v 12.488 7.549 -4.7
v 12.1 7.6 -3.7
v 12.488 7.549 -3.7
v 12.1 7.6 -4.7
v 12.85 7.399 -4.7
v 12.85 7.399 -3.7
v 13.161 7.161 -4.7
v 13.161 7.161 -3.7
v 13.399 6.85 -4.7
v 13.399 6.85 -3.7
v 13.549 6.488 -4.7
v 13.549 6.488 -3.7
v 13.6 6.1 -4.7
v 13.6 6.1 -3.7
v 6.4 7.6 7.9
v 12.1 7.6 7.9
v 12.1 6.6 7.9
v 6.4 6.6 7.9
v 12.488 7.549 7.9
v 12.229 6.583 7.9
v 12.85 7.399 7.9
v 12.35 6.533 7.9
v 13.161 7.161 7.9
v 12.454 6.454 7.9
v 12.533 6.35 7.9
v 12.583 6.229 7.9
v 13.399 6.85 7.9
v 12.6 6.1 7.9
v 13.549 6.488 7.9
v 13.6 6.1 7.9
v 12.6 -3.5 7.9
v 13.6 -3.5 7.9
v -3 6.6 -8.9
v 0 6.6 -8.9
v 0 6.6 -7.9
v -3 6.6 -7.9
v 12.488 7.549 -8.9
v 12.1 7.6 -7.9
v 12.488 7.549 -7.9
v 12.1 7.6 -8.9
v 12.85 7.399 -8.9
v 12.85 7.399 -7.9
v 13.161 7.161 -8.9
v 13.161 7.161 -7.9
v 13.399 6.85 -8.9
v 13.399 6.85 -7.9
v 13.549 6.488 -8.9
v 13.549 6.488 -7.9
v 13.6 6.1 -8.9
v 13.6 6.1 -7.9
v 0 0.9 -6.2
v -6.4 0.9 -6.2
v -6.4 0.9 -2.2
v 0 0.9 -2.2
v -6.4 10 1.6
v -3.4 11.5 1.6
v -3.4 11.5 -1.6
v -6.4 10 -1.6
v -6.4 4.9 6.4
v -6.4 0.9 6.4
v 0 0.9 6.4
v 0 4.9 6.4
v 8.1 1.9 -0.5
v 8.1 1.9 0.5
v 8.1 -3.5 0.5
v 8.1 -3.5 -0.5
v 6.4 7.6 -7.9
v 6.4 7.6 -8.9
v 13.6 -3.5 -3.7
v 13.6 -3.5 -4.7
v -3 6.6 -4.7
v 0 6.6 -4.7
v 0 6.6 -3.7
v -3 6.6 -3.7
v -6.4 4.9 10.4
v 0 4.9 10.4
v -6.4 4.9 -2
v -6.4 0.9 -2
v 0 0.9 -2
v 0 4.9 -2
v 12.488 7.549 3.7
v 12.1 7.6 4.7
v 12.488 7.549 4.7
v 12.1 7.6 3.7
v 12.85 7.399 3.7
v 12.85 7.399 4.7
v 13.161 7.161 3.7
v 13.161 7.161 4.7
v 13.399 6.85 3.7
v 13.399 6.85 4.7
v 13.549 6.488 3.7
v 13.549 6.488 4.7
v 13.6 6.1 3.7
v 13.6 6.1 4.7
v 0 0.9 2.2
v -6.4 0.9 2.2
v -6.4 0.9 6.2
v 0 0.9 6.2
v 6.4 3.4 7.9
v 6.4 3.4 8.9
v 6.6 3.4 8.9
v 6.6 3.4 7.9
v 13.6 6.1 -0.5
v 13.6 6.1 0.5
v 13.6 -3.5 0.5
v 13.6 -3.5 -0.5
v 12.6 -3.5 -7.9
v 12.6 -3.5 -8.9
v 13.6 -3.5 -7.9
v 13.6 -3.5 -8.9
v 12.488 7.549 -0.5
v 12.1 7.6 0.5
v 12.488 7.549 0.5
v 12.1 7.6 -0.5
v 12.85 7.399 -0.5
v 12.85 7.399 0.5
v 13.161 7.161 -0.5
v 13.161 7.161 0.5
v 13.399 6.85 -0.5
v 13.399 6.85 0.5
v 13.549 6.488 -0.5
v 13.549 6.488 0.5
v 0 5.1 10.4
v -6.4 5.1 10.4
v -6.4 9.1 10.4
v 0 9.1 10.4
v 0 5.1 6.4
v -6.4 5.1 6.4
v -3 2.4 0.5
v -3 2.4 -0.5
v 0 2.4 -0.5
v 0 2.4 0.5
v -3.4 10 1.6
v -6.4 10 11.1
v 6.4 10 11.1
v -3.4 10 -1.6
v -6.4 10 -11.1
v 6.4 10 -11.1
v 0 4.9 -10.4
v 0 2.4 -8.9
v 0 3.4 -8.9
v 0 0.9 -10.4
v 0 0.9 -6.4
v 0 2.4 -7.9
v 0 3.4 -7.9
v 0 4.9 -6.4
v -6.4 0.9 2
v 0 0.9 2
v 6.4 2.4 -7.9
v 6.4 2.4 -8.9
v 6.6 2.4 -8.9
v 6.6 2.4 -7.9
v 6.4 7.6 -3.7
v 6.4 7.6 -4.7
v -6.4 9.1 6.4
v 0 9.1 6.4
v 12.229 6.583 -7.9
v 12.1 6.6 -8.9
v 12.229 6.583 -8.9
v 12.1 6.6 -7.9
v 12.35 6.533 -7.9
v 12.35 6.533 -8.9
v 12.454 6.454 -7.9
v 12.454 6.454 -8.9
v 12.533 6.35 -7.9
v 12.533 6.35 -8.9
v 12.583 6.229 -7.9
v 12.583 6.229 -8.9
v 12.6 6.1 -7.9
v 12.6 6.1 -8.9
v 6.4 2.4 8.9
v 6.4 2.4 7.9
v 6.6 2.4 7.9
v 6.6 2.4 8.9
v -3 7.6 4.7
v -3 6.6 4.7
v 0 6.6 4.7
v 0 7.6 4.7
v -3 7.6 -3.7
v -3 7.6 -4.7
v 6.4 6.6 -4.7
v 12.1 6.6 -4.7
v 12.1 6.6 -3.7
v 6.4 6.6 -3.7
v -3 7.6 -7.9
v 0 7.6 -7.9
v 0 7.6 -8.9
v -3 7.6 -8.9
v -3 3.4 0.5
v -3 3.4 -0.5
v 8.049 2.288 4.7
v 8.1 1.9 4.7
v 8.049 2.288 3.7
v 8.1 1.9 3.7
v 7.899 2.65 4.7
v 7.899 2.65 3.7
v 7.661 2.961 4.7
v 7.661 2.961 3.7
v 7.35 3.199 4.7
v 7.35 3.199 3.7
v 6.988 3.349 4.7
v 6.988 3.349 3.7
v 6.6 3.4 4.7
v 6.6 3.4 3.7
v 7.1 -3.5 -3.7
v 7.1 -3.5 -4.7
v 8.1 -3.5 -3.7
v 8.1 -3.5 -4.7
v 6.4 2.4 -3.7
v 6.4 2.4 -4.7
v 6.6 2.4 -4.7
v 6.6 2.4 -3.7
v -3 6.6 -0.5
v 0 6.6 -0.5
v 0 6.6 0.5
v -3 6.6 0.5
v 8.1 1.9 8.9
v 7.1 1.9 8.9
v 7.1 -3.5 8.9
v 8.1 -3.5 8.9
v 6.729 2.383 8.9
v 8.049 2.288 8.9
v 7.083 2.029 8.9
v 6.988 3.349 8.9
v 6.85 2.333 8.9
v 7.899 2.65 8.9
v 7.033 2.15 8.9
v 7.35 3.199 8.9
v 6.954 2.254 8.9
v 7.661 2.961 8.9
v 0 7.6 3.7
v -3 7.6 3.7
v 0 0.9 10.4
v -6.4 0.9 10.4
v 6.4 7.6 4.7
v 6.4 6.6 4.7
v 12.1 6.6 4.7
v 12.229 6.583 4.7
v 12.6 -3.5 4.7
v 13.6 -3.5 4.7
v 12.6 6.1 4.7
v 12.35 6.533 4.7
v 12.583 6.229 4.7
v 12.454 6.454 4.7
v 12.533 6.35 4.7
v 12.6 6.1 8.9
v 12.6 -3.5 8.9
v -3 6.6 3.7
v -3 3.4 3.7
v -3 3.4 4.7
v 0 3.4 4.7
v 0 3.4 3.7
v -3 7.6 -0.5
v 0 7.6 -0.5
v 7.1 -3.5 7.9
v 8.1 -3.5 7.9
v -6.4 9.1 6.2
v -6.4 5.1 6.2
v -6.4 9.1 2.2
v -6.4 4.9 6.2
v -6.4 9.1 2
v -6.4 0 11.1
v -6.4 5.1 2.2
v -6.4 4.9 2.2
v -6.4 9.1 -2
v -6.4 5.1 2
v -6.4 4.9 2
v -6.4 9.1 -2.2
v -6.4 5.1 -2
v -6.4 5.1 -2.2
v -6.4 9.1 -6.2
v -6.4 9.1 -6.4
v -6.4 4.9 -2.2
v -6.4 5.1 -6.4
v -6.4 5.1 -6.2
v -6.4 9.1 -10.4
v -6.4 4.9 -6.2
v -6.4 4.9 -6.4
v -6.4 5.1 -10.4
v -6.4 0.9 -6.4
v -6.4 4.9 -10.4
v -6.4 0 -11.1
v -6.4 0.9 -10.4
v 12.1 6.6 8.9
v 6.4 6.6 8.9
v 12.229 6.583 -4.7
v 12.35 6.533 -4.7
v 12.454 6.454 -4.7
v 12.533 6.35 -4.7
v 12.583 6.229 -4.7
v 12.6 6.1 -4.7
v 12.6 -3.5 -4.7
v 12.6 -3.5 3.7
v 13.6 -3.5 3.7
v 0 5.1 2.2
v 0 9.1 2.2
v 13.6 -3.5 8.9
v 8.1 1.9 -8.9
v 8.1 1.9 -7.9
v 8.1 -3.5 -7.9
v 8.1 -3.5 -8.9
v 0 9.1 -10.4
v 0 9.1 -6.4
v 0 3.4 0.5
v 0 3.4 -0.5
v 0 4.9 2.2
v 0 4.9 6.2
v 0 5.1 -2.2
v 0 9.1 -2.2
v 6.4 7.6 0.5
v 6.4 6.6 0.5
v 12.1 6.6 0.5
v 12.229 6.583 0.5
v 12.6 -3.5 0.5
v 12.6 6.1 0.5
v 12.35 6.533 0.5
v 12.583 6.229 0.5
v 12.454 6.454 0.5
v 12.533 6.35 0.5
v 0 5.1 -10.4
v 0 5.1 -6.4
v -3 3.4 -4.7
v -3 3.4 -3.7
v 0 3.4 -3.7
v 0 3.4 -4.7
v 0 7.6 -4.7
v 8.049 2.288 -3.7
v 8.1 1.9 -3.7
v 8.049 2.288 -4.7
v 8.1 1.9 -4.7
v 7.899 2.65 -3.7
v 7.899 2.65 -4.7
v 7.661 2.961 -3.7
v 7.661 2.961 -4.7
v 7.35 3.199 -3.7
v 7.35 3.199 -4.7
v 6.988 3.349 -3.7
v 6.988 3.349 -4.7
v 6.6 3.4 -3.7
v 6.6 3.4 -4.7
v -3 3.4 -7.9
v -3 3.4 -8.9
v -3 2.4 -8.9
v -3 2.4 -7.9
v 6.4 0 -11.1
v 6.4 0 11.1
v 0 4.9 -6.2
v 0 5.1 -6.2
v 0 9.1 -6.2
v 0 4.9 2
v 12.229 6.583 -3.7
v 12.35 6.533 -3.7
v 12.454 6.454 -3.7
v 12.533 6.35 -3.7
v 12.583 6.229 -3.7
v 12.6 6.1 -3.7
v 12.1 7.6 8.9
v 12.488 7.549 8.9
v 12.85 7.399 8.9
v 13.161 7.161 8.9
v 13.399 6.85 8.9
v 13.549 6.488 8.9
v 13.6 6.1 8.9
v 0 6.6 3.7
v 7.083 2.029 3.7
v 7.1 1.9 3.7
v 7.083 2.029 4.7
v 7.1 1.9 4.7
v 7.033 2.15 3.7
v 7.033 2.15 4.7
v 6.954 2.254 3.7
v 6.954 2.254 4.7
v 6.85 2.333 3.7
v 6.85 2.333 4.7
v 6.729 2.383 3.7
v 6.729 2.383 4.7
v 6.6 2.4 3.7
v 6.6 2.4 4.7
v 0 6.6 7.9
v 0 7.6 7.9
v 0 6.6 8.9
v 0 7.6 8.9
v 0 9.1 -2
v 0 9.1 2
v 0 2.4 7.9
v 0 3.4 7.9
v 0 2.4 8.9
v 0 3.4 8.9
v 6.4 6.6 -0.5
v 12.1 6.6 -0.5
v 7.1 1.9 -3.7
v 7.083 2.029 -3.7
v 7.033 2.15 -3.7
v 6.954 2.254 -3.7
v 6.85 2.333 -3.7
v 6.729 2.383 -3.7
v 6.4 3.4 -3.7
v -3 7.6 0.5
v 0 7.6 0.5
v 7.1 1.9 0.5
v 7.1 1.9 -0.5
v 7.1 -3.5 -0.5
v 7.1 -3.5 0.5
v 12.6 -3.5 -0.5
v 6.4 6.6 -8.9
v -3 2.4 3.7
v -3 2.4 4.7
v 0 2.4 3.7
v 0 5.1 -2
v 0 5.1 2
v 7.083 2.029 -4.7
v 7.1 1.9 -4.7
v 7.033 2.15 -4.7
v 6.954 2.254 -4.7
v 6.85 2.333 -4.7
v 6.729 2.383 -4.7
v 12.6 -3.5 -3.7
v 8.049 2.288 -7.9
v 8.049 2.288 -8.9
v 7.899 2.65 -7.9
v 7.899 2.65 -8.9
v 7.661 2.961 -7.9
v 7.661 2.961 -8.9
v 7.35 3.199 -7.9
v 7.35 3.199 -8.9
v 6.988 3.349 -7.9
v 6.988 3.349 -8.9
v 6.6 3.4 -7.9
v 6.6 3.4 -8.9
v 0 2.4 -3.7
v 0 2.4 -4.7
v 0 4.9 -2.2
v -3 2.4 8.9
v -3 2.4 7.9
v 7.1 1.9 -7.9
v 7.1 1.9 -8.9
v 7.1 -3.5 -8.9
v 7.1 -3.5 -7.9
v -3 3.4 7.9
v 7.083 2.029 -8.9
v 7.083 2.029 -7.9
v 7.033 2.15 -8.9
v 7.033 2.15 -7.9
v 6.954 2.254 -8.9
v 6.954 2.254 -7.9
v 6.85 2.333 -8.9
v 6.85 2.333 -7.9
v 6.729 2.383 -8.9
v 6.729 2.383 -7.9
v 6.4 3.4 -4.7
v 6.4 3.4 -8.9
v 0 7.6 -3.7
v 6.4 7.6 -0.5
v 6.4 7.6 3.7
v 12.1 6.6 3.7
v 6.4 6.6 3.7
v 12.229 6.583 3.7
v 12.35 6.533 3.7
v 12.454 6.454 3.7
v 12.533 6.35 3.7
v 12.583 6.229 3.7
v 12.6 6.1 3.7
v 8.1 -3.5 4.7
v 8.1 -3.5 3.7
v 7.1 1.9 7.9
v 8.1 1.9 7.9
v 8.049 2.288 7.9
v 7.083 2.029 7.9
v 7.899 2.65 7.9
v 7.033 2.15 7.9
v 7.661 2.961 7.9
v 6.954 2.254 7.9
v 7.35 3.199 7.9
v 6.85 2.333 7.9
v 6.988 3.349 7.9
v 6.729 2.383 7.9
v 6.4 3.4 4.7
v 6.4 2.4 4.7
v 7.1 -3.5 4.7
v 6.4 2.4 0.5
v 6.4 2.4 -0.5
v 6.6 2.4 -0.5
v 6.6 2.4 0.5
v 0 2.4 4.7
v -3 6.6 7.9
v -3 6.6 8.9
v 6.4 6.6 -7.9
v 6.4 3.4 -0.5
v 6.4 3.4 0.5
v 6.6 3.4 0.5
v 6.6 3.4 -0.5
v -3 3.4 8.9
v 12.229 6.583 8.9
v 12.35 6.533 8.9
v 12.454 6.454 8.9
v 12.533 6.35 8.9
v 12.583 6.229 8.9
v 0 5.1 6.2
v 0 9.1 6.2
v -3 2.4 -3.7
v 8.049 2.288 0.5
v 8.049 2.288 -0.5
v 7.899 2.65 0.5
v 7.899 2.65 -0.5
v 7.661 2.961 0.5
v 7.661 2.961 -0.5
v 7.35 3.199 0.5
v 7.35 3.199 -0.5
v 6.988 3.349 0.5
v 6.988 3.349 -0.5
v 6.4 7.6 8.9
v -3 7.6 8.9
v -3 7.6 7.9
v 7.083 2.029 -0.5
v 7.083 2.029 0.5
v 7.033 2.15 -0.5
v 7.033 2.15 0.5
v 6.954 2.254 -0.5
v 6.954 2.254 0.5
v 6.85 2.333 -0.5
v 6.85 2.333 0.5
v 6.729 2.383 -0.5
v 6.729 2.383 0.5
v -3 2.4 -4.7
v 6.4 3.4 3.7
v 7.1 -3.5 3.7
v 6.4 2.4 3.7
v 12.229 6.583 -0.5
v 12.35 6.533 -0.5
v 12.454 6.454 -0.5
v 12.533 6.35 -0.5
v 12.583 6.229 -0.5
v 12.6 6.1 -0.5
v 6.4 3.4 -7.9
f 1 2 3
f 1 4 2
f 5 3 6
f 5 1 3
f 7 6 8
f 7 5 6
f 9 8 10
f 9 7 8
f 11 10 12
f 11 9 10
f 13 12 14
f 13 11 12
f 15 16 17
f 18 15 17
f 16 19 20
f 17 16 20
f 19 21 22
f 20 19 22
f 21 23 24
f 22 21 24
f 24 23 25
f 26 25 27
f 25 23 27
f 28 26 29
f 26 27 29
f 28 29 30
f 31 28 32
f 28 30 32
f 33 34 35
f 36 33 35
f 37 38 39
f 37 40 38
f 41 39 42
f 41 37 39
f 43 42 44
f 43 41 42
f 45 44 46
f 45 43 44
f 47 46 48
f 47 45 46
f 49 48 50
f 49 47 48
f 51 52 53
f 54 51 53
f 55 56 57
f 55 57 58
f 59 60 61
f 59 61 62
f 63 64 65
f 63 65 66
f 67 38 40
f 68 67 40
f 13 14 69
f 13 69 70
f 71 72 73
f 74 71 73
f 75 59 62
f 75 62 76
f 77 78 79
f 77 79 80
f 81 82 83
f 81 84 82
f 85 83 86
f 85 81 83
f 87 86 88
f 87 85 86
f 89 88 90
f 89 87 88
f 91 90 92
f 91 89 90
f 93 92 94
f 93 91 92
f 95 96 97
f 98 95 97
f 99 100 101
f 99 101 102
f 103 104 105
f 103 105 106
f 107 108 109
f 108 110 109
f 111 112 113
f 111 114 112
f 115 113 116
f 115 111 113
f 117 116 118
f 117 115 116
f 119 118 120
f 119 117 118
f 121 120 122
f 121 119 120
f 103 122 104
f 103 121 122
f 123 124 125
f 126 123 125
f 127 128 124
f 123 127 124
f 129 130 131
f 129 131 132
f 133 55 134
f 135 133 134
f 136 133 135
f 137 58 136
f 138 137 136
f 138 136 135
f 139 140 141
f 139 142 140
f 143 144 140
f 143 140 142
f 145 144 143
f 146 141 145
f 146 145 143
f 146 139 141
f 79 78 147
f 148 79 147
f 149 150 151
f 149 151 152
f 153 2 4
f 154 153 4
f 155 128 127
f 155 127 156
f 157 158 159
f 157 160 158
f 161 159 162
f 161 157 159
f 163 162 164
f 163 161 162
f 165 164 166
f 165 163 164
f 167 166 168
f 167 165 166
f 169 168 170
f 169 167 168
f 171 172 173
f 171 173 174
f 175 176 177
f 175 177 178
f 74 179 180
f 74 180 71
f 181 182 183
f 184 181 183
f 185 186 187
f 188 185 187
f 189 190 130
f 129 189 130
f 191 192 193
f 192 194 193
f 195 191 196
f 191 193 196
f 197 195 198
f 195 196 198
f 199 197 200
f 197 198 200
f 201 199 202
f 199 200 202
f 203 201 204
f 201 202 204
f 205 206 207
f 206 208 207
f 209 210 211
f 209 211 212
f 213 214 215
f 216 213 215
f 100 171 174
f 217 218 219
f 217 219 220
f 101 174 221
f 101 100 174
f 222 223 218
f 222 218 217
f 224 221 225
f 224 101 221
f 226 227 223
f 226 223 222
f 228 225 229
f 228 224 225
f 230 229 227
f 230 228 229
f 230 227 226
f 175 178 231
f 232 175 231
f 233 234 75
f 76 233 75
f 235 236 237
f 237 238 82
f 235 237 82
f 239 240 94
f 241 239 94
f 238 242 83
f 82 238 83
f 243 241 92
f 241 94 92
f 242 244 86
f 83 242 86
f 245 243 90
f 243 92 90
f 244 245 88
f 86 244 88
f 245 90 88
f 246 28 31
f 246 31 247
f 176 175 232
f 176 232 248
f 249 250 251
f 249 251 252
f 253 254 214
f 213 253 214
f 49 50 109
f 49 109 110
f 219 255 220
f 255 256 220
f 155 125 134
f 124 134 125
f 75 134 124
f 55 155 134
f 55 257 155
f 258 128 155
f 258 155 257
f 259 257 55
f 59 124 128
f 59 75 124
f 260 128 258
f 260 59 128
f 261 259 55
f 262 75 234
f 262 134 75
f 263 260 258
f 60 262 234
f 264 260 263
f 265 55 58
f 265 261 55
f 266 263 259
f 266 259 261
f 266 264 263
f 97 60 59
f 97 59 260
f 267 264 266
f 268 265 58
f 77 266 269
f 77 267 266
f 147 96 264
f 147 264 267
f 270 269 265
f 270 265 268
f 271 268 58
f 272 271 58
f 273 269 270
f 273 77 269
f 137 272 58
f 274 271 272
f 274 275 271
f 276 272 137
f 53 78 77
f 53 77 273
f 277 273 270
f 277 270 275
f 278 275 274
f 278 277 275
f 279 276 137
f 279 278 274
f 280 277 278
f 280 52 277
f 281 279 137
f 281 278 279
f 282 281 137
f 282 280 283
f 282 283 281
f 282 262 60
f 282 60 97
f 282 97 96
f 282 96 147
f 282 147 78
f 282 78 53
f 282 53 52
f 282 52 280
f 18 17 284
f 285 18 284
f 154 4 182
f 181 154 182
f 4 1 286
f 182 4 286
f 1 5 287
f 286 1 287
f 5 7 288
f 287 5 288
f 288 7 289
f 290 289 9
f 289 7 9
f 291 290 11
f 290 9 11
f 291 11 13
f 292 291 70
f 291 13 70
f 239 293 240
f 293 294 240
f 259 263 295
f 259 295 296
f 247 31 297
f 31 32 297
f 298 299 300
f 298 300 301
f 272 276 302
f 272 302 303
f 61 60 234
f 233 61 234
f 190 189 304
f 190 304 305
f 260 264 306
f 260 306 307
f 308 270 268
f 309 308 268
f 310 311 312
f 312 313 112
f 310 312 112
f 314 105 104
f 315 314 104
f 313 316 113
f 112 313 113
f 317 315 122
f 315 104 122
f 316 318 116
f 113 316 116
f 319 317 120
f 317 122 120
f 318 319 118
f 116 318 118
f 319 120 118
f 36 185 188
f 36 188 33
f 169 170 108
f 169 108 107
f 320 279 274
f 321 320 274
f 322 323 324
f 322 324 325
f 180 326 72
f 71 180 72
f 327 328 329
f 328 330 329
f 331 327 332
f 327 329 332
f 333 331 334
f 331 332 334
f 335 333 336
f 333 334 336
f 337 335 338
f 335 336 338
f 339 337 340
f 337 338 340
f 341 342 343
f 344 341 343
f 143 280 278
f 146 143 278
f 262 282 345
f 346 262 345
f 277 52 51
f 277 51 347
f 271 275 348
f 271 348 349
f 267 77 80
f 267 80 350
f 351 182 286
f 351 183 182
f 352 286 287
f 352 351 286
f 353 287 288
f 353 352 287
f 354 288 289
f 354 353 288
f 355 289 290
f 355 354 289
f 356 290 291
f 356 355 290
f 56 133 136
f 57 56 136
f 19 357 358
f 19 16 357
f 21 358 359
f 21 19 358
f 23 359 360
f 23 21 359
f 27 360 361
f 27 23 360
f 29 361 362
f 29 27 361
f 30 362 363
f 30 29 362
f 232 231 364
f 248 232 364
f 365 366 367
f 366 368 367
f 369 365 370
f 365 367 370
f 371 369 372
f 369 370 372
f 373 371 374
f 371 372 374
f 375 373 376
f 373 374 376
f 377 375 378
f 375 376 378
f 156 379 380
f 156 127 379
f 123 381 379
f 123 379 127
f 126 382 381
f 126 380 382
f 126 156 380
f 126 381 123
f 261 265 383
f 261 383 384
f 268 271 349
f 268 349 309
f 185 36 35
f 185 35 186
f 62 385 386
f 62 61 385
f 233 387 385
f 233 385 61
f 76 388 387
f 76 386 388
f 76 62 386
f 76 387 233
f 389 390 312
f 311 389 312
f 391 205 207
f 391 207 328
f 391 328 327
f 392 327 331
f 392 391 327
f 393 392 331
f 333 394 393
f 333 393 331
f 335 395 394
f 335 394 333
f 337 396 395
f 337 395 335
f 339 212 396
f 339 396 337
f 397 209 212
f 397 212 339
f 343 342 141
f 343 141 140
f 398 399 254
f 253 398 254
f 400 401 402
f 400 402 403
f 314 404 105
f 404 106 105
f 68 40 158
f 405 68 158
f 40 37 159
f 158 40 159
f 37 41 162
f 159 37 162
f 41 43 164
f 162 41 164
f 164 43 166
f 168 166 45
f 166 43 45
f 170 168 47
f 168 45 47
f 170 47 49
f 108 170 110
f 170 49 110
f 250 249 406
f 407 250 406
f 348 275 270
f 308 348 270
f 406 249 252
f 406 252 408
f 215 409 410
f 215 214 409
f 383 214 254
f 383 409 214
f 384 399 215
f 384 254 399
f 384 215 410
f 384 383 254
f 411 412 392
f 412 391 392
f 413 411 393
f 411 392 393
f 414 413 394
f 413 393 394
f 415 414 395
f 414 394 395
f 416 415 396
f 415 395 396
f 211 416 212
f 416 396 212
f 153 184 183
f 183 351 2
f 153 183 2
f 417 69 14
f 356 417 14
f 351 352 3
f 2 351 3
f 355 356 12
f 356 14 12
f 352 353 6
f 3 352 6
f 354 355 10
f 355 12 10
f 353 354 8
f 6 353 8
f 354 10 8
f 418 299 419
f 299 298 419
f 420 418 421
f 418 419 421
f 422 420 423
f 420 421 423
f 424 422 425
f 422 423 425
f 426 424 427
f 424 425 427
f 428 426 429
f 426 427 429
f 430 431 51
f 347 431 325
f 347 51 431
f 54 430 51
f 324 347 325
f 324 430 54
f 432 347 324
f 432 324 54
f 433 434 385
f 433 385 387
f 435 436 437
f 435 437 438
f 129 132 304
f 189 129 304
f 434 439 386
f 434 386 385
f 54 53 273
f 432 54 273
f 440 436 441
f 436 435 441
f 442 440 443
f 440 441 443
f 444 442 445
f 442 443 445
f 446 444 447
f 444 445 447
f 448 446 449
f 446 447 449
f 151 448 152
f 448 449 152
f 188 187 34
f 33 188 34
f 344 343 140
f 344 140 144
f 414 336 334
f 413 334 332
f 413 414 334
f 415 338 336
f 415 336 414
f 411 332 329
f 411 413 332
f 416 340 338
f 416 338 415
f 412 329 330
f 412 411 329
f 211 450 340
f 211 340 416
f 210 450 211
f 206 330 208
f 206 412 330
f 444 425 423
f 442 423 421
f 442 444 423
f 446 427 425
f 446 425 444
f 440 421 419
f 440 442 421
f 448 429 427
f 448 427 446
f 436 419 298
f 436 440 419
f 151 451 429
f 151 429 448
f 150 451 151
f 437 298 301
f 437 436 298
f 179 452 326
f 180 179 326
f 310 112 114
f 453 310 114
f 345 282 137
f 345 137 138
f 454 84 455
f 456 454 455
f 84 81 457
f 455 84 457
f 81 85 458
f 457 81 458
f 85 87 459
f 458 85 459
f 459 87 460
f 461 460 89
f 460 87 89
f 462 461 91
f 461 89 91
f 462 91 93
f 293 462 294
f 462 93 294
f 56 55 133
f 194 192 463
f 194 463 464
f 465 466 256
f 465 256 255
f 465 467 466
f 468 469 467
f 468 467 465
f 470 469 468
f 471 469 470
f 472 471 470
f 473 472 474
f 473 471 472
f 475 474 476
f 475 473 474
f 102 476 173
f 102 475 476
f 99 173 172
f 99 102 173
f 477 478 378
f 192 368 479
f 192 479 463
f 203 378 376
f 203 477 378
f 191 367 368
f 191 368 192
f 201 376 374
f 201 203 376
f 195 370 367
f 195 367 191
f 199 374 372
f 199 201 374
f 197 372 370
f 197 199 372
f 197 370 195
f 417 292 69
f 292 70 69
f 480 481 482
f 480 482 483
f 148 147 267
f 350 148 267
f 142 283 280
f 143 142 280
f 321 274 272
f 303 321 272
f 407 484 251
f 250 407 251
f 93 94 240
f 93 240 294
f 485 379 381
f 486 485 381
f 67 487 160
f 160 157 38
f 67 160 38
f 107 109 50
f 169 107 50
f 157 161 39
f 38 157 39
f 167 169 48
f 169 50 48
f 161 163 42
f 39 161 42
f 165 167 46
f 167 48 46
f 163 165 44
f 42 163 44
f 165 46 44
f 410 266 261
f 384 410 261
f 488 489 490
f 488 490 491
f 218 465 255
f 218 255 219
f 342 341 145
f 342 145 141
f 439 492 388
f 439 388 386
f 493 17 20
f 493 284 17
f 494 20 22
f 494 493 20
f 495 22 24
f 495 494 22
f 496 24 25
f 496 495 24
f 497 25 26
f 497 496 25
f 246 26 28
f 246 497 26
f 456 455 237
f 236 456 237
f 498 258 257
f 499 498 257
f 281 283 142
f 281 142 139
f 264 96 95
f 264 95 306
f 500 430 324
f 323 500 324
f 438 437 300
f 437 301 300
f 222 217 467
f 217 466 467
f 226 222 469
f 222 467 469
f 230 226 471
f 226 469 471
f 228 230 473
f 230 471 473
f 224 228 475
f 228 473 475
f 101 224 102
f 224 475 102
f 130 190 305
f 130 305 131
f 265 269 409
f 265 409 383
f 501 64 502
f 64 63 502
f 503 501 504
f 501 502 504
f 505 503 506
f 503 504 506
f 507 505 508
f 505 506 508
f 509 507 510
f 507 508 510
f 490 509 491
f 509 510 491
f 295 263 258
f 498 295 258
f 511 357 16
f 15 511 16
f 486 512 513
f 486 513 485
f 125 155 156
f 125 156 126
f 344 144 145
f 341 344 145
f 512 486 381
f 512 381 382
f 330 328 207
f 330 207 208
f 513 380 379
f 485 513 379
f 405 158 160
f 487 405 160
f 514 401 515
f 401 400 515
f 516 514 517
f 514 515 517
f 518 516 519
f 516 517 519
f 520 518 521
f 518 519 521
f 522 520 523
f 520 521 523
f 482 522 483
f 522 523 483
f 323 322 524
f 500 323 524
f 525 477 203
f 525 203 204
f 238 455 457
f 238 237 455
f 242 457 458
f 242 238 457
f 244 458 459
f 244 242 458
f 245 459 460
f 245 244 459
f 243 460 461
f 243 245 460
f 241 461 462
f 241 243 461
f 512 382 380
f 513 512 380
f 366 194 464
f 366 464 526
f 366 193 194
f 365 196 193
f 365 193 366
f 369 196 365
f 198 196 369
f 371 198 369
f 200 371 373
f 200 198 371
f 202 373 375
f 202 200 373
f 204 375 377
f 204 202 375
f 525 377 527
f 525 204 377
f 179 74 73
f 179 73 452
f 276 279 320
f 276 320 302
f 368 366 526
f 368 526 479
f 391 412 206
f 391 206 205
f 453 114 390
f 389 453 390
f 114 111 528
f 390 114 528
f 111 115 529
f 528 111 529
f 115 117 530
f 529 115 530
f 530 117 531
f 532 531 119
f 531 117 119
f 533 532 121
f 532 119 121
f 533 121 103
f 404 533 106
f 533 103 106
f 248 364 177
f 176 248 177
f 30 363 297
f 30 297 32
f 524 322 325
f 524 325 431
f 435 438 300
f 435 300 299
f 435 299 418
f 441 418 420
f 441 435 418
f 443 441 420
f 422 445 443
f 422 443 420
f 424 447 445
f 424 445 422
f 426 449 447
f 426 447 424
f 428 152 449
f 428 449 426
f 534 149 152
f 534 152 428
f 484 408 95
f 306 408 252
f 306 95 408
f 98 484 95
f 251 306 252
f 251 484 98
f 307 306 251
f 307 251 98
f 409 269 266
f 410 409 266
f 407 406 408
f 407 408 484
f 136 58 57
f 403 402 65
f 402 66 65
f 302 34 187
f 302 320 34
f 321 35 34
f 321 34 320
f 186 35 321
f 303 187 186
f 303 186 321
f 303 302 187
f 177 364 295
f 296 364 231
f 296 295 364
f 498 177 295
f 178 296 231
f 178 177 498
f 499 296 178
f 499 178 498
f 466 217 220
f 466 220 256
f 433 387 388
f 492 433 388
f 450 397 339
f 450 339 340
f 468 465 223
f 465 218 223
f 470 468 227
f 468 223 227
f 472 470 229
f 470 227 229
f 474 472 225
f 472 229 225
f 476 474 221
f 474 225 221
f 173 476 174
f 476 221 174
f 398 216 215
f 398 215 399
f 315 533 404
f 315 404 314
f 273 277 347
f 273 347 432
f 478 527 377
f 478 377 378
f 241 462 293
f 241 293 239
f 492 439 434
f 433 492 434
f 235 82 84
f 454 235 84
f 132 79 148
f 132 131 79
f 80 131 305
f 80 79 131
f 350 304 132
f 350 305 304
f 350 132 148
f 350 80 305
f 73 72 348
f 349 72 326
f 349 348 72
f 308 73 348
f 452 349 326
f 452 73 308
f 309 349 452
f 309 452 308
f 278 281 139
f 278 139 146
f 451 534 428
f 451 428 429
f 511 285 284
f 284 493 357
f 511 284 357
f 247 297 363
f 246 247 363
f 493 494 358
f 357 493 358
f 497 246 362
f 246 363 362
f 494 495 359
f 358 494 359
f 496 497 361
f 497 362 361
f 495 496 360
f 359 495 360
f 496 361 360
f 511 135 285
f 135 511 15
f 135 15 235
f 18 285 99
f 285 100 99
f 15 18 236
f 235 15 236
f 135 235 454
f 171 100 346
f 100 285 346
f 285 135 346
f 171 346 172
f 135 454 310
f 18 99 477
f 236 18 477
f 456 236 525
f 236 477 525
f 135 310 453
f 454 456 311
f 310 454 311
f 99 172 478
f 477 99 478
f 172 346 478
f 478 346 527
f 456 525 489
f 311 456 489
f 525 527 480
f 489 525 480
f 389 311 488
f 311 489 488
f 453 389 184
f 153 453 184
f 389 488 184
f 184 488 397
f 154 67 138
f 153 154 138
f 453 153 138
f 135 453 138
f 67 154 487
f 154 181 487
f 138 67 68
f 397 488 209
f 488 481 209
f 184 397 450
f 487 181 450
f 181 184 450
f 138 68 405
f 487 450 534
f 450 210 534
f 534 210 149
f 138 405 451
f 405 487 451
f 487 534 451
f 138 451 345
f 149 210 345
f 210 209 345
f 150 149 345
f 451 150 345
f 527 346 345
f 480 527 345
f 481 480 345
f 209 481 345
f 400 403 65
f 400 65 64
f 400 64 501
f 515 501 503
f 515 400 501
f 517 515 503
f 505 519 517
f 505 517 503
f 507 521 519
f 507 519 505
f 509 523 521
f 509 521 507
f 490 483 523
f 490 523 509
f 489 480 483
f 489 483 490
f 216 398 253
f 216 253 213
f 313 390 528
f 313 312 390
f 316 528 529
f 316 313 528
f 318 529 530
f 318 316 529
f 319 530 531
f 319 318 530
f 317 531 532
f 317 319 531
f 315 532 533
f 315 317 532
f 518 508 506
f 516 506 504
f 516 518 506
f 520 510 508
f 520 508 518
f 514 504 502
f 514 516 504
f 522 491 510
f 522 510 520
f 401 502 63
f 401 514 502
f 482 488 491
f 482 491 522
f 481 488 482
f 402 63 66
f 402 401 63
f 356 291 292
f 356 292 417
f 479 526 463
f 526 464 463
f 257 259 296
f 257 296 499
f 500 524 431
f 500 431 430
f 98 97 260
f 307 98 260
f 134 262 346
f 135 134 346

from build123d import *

# Parameters (mm, degrees)
SKETCH_1_W                  = 12.8
SKETCH_1_H                  = 22.2
EXTRUDE_1_DEPTH             = 10
SKETCH_3_W                  = 4
SKETCH_3_H                  = 4
CUT_EXTRUDE_1_DEPTH         = 6.4
PATTERN_LINEAR_1_COUNT      = 5
PATTERN_LINEAR_1_PITCH      = 4.2
PATTERN_LINEAR_1_COUNT_DIR2 = 2
PATTERN_LINEAR_1_PITCH_DIR2 = 4.2
SKETCH_12_W                 = 1
SKETCH_12_H                 = 1
CUT_EXTRUDE_2_DEPTH         = 6.4
PATTERN_LINEAR_2_COUNT      = 5
PATTERN_LINEAR_2_PITCH      = 4.2
PATTERN_LINEAR_2_COUNT_DIR2 = 2
PATTERN_LINEAR_2_PITCH_DIR2 = 4.2
SKETCH_14_W                 = 1
SKETCH_14_H                 = 1
SKETCH_16_W                 = 1
SKETCH_16_H                 = 1
PATTERN_LINEAR_3_COUNT      = 5
PATTERN_LINEAR_3_PITCH      = 4.2
SKETCH_18_W                 = 3
SKETCH_18_H                 = 3.2
EXTRUDE_2_DEPTH             = 1.5
CUT_EXTRUDE_3_DEPTH         = 3.2


with BuildPart() as part:
    # Эскиз1 → Бобышка-Вытянуть1 (new body)
    with BuildSketch(Plane(origin=(0, 0, 0), x_dir=(1, 0, 0), z_dir=(0, 1, 0))):
        Rectangle(SKETCH_1_W, SKETCH_1_H)
    extrude(amount=EXTRUDE_1_DEPTH)

    # Эскиз3 → Вырез-Вытянуть1 (cut)
    with BuildSketch(Plane.ZY.offset(6.4)):
        with Locations((-8.4, 7.1)):
            Rectangle(SKETCH_3_W, SKETCH_3_H)
    cut_extrude_1 = extrude(amount=-CUT_EXTRUDE_1_DEPTH, mode=Mode.SUBTRACT)

    # Линейный массив1: Cut-Extrude 1 5 × 2
    with Locations(*[(0, -j * PATTERN_LINEAR_1_PITCH_DIR2, i * PATTERN_LINEAR_1_PITCH) for i in range(PATTERN_LINEAR_1_COUNT) for j in range(PATTERN_LINEAR_1_COUNT_DIR2) if (i, j) != (0, 0)]):
        add(cut_extrude_1, mode=Mode.SUBTRACT)

    # Эскиз12 → Вырез-Вытянуть2 (cut)
    with BuildSketch(Plane(origin=(6.4, 0, 0), x_dir=(0, 0, -1), z_dir=(1, 0, 0))):
        with Locations((-8.4, 7.1)):
            Rectangle(SKETCH_12_W, SKETCH_12_H)
    cut_extrude_2 = extrude(amount=-CUT_EXTRUDE_2_DEPTH, mode=Mode.SUBTRACT)

    # Линейный массив2: Cut-Extrude 2 5 × 2
    with Locations(*[(0, -j * PATTERN_LINEAR_2_PITCH_DIR2, -i * PATTERN_LINEAR_2_PITCH) for i in range(PATTERN_LINEAR_2_COUNT) for j in range(PATTERN_LINEAR_2_COUNT_DIR2) if (i, j) != (0, 0)]):
        add(cut_extrude_2, mode=Mode.SUBTRACT)

    # По траектории6: sweep along a path in Эскиз15
    with BuildLine(Plane.XY.offset(11.1)) as sweep_6_path:
        Line((-3, 7.1), (12.1, 7.1))
        ThreePointArc((12.1, 7.1), (12.807106781, 6.807106781), (13.1, 6.1))
        Line((13.1, 6.1), (13.1, -3.5))
    # Эскиз14 → По траектории6 (sweep)
    with BuildSketch(Plane(origin=(0, -3.5, 0), x_dir=(1, 0, 0), z_dir=(0, 1, 0))):
        with Locations((13.1, -8.4)):
            Rectangle(SKETCH_14_W, SKETCH_14_H)
    sweep_6 = sweep(path=sweep_6_path.line)

    # По траектории7: sweep along a path in Эскиз17
    with BuildLine(Plane.XY.offset(11.1)) as sweep_7_path:
        Line((7.6, -3.5), (7.6, 1.9))
        ThreePointArc((7.6, 1.9), (7.307106781, 2.607106781), (6.6, 2.9))
        Line((6.6, 2.9), (-3, 2.9))
    # Эскиз16 → По траектории7 (sweep)
    with BuildSketch(Plane(origin=(0, -3.5, 0), x_dir=(1, 0, 0), z_dir=(0, 1, 0))):
        with Locations((7.6, -8.4)):
            Rectangle(SKETCH_16_W, SKETCH_16_H)
    sweep_7 = sweep(path=sweep_7_path.line)

    # Линейный массив3: По траектории6, По траектории7 ×5
    with Locations(*[(0, 0, -i * PATTERN_LINEAR_3_PITCH) for i in range(1, PATTERN_LINEAR_3_COUNT)]):
        add(sweep_6)
        add(sweep_7)

    # Эскиз18 → Бобышка-Вытянуть2 (add)
    with BuildSketch(Plane(origin=(0, 10, 0), x_dir=(1, 0, 0), z_dir=(0, 1, 0))):
        with Locations((-4.9, 0)):
            Rectangle(SKETCH_18_W, SKETCH_18_H)
    extrude(amount=EXTRUDE_2_DEPTH)

    # Эскиз19 → Вырез-Вытянуть3 (cut)
    with BuildSketch(Plane.XY.offset(1.6)):
        Polygon((-3.4, 11.5), (-6.4, 10), (-6.4, 11.5), align=None)
    extrude(amount=-CUT_EXTRUDE_3_DEPTH, mode=Mode.SUBTRACT)


solid = part.part
